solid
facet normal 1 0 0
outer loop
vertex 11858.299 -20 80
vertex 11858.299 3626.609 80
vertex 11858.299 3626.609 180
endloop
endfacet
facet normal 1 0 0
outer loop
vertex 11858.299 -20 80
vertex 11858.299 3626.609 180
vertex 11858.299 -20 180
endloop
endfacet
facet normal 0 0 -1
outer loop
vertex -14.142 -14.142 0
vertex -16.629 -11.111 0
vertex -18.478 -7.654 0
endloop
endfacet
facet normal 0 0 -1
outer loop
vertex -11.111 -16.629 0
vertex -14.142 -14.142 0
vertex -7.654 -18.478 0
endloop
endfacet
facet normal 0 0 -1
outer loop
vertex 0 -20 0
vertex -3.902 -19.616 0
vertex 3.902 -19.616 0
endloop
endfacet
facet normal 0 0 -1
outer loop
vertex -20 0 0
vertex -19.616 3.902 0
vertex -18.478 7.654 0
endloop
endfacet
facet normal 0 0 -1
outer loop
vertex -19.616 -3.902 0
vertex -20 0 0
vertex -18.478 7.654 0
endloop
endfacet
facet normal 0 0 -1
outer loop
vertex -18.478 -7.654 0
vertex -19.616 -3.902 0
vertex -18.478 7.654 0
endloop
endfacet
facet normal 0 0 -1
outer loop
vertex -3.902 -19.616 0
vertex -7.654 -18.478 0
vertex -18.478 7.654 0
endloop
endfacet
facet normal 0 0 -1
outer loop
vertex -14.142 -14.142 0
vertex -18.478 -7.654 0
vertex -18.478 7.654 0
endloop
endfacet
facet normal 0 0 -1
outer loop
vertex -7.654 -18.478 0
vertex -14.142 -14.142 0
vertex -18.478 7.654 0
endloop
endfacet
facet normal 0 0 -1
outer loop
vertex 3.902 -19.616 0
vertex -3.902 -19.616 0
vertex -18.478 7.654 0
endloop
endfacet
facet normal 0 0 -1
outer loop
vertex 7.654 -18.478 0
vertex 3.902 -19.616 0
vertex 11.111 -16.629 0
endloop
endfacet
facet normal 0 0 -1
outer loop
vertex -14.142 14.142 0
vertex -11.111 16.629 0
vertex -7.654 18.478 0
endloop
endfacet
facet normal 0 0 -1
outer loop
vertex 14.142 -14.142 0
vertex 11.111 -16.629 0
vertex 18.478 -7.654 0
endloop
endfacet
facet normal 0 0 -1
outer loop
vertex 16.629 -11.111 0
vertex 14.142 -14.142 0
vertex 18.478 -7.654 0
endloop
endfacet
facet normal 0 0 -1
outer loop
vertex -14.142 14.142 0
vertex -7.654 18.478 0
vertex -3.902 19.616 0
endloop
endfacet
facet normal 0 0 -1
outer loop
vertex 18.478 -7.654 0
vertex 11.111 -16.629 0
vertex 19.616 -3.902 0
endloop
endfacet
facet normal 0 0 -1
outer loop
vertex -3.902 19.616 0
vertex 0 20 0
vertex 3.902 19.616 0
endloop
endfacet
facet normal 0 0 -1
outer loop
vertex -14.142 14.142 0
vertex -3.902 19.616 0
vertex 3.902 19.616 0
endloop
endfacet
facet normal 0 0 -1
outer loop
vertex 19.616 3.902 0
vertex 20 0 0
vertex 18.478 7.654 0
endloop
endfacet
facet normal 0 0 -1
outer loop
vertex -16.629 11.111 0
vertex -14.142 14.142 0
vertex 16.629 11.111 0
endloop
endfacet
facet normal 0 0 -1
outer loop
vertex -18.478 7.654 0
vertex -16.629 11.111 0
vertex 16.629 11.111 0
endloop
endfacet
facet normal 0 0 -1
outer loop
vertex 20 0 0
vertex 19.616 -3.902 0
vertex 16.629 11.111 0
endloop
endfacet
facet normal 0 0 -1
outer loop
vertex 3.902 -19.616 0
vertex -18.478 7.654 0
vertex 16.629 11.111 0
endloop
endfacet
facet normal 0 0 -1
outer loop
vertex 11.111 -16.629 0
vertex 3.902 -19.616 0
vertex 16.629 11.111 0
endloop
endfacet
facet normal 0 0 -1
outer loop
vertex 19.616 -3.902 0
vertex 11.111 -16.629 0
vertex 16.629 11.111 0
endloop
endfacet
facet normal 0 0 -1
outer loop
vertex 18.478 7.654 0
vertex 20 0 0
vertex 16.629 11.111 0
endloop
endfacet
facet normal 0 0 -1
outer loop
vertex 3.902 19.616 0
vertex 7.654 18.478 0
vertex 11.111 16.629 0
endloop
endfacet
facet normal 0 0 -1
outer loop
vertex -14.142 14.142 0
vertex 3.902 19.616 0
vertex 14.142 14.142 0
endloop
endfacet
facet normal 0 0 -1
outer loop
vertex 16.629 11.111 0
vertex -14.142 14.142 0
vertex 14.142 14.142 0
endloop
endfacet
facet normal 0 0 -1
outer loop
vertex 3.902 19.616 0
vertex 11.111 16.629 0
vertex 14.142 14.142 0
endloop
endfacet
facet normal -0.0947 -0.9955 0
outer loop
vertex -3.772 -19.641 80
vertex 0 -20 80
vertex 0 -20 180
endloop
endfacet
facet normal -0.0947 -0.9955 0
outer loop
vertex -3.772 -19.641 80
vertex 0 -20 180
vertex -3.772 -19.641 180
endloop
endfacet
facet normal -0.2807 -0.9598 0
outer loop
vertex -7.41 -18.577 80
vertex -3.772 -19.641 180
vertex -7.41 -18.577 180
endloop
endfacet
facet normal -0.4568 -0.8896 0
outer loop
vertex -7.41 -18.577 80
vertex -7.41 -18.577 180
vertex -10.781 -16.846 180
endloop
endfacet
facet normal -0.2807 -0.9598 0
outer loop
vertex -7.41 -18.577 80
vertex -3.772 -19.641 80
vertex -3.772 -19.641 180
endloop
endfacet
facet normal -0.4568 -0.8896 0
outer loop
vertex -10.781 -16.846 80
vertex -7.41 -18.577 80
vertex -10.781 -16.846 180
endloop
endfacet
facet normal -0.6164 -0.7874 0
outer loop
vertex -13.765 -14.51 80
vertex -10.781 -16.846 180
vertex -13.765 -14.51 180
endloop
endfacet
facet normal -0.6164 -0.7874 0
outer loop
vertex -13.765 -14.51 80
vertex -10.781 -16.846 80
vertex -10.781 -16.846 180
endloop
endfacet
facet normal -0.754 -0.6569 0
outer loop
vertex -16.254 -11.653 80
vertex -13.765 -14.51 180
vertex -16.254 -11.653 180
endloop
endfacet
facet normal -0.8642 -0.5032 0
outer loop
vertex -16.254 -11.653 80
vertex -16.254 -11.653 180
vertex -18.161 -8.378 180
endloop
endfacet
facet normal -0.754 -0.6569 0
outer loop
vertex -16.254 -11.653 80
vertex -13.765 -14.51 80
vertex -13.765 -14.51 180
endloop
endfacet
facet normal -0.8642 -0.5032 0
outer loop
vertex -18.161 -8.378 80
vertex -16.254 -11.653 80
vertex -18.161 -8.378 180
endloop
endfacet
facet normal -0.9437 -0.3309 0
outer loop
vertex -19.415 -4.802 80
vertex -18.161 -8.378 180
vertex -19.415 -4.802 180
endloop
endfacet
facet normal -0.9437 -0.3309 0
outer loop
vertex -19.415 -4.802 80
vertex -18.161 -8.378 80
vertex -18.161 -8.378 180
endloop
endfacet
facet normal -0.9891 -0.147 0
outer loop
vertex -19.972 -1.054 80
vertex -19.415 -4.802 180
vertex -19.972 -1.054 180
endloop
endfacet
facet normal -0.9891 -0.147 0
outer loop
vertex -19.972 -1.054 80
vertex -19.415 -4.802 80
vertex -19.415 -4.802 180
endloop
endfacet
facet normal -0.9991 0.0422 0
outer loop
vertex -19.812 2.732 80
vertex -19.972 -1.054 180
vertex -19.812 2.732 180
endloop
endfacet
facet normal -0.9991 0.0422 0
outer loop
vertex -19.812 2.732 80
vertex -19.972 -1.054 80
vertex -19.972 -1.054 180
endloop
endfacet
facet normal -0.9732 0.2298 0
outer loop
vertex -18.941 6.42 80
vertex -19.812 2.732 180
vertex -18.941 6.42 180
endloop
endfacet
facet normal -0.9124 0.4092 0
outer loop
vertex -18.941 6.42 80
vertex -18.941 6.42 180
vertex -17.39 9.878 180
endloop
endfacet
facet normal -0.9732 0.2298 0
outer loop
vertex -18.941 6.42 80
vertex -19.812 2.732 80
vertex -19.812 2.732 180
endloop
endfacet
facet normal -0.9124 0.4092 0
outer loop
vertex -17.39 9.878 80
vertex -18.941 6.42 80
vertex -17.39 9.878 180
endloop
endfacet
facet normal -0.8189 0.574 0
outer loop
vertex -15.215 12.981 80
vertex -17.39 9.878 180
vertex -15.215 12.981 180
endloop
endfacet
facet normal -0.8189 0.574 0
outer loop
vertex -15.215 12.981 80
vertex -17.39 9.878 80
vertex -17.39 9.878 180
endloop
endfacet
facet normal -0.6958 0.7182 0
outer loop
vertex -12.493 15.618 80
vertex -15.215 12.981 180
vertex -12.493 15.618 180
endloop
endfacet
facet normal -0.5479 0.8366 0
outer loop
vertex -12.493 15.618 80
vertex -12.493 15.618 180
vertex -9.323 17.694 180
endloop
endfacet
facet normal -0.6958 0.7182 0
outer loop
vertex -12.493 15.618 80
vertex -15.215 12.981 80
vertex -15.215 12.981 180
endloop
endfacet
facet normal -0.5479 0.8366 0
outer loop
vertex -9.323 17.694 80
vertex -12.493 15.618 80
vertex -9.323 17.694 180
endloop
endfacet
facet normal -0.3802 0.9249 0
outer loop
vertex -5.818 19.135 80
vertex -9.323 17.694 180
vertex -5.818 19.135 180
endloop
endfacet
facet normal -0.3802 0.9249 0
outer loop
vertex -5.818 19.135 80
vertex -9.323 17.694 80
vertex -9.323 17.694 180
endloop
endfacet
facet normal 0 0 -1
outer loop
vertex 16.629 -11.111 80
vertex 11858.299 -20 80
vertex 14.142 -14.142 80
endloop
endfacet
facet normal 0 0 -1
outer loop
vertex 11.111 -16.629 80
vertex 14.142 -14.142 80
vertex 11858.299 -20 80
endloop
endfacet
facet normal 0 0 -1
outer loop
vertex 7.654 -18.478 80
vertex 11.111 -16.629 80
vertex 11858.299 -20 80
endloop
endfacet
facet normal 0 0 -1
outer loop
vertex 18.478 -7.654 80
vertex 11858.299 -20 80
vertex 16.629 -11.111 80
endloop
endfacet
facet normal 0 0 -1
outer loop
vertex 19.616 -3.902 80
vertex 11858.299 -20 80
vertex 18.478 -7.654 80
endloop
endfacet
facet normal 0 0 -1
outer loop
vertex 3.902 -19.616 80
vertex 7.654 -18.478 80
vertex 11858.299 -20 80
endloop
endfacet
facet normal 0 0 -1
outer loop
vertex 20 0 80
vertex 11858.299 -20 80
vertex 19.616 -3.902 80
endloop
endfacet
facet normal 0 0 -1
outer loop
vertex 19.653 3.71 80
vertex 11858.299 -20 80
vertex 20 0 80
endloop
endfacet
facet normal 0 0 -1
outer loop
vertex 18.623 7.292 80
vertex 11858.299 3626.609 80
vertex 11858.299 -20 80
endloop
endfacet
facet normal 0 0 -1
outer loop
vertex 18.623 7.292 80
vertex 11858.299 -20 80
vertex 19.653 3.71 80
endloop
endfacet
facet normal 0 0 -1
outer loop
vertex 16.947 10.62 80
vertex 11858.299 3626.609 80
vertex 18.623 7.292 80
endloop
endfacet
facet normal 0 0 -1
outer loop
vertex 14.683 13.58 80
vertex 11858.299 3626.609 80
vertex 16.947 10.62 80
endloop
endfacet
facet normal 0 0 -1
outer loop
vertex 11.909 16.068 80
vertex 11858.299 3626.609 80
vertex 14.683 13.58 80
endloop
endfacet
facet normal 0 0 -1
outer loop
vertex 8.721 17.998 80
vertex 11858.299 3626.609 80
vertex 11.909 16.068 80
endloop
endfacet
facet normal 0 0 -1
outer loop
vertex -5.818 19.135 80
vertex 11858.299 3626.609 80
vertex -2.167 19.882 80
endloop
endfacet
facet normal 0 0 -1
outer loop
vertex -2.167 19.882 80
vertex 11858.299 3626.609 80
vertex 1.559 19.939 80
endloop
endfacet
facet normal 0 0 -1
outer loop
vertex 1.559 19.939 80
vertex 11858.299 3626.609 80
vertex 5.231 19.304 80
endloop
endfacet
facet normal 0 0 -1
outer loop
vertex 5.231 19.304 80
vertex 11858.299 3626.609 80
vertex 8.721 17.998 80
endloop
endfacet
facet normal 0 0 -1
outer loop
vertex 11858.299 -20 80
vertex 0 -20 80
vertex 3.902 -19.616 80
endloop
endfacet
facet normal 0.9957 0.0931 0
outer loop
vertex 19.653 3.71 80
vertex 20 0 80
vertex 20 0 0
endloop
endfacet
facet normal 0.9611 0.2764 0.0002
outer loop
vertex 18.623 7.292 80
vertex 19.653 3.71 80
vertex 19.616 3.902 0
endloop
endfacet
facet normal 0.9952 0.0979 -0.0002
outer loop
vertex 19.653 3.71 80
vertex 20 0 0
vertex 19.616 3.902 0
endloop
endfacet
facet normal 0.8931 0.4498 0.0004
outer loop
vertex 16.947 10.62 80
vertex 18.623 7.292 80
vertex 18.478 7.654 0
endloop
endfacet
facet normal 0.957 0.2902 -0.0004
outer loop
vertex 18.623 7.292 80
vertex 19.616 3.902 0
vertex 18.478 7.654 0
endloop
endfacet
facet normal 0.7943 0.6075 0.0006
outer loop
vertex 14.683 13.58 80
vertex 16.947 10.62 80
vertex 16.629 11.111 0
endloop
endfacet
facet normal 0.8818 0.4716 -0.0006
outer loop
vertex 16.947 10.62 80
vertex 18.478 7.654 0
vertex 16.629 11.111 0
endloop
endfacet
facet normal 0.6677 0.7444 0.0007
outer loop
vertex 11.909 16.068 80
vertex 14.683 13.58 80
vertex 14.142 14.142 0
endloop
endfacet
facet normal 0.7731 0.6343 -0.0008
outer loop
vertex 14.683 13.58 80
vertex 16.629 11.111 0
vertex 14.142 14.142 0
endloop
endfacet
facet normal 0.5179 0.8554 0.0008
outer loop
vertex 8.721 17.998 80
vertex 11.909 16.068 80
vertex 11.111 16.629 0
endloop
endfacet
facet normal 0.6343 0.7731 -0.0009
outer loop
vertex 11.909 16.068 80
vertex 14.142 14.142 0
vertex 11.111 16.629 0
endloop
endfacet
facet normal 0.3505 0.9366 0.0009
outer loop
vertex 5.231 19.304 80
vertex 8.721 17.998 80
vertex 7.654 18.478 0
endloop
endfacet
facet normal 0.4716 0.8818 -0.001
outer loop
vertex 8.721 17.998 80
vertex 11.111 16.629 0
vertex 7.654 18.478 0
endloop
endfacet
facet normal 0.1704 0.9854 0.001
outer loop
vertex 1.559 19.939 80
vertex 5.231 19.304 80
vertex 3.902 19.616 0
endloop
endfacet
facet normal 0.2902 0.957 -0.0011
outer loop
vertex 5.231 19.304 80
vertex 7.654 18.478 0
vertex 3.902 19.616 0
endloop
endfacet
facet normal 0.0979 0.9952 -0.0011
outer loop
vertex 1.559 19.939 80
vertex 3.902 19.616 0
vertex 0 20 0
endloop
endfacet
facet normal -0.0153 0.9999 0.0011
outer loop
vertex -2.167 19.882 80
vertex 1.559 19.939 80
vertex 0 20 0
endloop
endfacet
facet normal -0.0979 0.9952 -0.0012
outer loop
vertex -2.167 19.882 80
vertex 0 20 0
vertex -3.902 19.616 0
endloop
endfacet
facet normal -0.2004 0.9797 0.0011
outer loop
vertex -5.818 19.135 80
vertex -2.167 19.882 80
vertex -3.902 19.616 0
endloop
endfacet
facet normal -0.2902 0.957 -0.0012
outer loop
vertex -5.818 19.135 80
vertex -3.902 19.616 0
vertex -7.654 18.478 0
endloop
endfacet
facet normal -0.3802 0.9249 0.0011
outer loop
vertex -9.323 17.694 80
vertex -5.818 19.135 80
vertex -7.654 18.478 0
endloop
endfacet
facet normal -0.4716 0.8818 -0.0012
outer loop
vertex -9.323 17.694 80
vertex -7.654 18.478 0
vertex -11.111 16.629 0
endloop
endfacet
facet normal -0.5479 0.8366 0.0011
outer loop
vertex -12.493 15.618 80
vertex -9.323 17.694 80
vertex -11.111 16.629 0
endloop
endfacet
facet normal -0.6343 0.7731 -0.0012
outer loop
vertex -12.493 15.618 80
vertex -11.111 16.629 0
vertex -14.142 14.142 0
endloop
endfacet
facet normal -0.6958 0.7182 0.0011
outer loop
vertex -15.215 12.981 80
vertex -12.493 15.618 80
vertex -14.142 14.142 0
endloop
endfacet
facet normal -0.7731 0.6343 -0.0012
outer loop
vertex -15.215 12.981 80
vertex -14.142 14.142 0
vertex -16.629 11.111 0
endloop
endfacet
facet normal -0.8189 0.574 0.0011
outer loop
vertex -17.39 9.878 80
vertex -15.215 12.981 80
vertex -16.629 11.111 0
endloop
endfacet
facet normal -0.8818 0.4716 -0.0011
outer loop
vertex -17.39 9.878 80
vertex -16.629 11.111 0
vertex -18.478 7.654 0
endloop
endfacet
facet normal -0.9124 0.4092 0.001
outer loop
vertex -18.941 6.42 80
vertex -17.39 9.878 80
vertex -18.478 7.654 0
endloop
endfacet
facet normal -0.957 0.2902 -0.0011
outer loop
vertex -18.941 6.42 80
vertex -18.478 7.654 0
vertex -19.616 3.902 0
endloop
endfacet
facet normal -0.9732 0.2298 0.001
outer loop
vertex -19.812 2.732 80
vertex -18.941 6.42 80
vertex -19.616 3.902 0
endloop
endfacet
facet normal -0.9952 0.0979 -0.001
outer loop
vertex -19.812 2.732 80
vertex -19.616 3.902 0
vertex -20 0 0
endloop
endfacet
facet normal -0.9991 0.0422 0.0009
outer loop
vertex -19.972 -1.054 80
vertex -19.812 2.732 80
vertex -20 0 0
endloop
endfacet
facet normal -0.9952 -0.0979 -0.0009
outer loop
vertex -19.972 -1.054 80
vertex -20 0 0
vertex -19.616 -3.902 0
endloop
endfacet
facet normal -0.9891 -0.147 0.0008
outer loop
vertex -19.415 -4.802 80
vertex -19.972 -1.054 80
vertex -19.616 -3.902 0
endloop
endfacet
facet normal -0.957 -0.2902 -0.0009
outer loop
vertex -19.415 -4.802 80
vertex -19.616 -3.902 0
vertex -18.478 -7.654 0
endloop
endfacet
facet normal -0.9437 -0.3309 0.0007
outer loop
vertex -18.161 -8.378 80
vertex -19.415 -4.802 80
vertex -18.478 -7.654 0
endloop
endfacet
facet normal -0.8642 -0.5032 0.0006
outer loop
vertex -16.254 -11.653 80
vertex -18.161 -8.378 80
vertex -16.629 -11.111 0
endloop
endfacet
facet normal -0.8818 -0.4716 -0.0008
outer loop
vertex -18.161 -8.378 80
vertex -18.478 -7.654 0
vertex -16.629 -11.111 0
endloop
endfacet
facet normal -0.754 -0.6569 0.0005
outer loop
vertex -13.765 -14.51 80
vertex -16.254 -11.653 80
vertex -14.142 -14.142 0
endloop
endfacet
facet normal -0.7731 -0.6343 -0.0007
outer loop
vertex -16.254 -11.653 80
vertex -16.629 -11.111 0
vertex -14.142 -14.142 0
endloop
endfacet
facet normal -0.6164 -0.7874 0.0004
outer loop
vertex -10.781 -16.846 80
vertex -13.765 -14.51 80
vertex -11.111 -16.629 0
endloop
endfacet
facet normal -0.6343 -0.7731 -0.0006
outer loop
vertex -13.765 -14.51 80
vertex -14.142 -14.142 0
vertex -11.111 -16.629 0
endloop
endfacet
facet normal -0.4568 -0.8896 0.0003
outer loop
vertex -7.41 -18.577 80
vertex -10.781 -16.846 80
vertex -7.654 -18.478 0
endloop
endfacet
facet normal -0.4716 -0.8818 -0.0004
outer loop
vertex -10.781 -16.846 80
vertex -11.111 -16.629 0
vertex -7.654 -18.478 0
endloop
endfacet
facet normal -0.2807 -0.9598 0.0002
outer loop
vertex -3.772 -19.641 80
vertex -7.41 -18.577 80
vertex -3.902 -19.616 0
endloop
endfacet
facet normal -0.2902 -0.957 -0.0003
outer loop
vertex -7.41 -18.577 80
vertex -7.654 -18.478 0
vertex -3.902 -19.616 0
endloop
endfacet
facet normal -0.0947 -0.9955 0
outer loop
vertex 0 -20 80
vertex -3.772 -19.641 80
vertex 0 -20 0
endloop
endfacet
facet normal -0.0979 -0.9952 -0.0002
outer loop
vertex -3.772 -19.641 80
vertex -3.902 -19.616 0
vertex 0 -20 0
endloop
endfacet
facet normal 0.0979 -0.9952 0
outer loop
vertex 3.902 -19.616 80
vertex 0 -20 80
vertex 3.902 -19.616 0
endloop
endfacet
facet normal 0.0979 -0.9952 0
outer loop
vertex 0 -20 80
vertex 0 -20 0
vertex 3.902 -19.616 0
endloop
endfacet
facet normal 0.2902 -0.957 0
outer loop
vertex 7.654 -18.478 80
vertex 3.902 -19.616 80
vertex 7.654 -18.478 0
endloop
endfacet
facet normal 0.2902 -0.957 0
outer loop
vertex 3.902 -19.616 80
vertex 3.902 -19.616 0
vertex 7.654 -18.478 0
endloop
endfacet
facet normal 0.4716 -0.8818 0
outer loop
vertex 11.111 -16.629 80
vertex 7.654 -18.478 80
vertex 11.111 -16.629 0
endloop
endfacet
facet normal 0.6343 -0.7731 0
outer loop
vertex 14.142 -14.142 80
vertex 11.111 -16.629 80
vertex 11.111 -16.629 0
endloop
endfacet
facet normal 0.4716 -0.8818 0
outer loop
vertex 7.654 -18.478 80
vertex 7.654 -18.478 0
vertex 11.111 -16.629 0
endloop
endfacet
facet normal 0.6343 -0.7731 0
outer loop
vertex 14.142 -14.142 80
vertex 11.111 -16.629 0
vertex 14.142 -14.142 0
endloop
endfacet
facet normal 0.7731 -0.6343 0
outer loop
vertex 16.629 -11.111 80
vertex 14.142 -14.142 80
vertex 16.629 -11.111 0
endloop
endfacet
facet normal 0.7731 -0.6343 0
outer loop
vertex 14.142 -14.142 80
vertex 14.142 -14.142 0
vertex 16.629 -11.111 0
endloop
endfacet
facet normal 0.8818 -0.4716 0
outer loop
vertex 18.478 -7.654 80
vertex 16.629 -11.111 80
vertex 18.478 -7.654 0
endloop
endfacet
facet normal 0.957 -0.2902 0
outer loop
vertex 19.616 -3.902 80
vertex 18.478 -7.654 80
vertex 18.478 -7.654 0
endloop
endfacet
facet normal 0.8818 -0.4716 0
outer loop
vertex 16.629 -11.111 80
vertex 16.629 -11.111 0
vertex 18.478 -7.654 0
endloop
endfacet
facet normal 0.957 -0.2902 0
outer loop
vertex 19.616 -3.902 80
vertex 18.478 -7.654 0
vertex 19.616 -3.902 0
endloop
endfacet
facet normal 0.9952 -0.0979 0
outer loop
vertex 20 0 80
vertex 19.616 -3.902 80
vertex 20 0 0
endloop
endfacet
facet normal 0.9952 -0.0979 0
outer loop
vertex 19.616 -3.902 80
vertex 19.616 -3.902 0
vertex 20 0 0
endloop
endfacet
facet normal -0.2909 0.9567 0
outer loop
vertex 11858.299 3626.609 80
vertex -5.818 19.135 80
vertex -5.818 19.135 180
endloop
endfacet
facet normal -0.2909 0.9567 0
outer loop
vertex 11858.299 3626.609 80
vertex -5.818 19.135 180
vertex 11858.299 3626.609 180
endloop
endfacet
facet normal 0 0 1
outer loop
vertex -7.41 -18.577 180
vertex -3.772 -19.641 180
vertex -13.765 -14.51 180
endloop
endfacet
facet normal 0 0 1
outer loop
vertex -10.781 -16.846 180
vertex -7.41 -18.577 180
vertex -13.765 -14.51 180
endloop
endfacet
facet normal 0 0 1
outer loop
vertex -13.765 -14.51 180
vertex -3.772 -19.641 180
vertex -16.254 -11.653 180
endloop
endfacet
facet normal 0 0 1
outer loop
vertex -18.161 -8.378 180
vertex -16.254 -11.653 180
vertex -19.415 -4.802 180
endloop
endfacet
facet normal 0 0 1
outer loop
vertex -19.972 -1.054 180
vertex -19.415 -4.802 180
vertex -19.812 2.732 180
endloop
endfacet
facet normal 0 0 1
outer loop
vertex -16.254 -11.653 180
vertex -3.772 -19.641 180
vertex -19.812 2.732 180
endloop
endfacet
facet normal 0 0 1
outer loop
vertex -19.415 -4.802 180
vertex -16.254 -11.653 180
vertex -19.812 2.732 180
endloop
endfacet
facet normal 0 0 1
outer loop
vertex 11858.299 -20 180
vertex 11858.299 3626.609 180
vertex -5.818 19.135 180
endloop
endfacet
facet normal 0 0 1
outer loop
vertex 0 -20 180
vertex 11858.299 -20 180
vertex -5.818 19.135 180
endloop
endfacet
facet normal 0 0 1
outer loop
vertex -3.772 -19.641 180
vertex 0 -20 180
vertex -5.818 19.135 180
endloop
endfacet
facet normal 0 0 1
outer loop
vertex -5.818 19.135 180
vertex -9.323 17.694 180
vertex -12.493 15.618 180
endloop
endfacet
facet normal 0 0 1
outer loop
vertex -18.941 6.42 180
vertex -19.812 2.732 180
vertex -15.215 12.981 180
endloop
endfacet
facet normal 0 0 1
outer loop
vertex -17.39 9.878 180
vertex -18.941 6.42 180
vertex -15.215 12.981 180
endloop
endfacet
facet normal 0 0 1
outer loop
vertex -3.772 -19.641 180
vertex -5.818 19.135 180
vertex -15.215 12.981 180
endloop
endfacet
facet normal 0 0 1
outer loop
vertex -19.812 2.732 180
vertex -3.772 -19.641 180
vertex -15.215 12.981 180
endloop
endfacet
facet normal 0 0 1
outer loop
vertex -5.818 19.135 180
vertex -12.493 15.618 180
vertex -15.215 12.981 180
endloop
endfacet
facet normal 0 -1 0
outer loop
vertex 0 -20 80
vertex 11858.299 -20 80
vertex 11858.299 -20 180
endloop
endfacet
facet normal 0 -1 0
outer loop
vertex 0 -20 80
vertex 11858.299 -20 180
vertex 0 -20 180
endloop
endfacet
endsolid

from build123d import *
from build123d.topology import SkipClean

# Parameters (mm, degrees)
SKETCH_1_R      = 20
EXTRUDE_1_DEPTH = 80
EXTRUDE_2_DEPTH = 100


with BuildPart() as part:
    # 草图1 → 凸台-拉伸1 (new body)
    with BuildSketch(Plane.XY):
        Circle(SKETCH_1_R)
    extrude(amount=EXTRUDE_1_DEPTH)

    # 草图2 → 凸台-拉伸2 (add)
    with SkipClean():  # the faces are left unmerged after this step: merging them gives an invalid solid
        with BuildSketch(Plane.XY.offset(80)):
            with BuildLine():
                Line((-5.818295023, 19.134979567), (11858.298972938, 3626.608622721))
                Line((11858.298972938, 3626.608622721), (11858.298972938, -20))
                Line((11858.298972938, -20), (0, -20))
                ThreePointArc((0, -20), (-19.78256292, -2.941122971), (-5.818295023, 19.134979567))
            make_face()
        extrude(amount=EXTRUDE_2_DEPTH)


solid = part.part
